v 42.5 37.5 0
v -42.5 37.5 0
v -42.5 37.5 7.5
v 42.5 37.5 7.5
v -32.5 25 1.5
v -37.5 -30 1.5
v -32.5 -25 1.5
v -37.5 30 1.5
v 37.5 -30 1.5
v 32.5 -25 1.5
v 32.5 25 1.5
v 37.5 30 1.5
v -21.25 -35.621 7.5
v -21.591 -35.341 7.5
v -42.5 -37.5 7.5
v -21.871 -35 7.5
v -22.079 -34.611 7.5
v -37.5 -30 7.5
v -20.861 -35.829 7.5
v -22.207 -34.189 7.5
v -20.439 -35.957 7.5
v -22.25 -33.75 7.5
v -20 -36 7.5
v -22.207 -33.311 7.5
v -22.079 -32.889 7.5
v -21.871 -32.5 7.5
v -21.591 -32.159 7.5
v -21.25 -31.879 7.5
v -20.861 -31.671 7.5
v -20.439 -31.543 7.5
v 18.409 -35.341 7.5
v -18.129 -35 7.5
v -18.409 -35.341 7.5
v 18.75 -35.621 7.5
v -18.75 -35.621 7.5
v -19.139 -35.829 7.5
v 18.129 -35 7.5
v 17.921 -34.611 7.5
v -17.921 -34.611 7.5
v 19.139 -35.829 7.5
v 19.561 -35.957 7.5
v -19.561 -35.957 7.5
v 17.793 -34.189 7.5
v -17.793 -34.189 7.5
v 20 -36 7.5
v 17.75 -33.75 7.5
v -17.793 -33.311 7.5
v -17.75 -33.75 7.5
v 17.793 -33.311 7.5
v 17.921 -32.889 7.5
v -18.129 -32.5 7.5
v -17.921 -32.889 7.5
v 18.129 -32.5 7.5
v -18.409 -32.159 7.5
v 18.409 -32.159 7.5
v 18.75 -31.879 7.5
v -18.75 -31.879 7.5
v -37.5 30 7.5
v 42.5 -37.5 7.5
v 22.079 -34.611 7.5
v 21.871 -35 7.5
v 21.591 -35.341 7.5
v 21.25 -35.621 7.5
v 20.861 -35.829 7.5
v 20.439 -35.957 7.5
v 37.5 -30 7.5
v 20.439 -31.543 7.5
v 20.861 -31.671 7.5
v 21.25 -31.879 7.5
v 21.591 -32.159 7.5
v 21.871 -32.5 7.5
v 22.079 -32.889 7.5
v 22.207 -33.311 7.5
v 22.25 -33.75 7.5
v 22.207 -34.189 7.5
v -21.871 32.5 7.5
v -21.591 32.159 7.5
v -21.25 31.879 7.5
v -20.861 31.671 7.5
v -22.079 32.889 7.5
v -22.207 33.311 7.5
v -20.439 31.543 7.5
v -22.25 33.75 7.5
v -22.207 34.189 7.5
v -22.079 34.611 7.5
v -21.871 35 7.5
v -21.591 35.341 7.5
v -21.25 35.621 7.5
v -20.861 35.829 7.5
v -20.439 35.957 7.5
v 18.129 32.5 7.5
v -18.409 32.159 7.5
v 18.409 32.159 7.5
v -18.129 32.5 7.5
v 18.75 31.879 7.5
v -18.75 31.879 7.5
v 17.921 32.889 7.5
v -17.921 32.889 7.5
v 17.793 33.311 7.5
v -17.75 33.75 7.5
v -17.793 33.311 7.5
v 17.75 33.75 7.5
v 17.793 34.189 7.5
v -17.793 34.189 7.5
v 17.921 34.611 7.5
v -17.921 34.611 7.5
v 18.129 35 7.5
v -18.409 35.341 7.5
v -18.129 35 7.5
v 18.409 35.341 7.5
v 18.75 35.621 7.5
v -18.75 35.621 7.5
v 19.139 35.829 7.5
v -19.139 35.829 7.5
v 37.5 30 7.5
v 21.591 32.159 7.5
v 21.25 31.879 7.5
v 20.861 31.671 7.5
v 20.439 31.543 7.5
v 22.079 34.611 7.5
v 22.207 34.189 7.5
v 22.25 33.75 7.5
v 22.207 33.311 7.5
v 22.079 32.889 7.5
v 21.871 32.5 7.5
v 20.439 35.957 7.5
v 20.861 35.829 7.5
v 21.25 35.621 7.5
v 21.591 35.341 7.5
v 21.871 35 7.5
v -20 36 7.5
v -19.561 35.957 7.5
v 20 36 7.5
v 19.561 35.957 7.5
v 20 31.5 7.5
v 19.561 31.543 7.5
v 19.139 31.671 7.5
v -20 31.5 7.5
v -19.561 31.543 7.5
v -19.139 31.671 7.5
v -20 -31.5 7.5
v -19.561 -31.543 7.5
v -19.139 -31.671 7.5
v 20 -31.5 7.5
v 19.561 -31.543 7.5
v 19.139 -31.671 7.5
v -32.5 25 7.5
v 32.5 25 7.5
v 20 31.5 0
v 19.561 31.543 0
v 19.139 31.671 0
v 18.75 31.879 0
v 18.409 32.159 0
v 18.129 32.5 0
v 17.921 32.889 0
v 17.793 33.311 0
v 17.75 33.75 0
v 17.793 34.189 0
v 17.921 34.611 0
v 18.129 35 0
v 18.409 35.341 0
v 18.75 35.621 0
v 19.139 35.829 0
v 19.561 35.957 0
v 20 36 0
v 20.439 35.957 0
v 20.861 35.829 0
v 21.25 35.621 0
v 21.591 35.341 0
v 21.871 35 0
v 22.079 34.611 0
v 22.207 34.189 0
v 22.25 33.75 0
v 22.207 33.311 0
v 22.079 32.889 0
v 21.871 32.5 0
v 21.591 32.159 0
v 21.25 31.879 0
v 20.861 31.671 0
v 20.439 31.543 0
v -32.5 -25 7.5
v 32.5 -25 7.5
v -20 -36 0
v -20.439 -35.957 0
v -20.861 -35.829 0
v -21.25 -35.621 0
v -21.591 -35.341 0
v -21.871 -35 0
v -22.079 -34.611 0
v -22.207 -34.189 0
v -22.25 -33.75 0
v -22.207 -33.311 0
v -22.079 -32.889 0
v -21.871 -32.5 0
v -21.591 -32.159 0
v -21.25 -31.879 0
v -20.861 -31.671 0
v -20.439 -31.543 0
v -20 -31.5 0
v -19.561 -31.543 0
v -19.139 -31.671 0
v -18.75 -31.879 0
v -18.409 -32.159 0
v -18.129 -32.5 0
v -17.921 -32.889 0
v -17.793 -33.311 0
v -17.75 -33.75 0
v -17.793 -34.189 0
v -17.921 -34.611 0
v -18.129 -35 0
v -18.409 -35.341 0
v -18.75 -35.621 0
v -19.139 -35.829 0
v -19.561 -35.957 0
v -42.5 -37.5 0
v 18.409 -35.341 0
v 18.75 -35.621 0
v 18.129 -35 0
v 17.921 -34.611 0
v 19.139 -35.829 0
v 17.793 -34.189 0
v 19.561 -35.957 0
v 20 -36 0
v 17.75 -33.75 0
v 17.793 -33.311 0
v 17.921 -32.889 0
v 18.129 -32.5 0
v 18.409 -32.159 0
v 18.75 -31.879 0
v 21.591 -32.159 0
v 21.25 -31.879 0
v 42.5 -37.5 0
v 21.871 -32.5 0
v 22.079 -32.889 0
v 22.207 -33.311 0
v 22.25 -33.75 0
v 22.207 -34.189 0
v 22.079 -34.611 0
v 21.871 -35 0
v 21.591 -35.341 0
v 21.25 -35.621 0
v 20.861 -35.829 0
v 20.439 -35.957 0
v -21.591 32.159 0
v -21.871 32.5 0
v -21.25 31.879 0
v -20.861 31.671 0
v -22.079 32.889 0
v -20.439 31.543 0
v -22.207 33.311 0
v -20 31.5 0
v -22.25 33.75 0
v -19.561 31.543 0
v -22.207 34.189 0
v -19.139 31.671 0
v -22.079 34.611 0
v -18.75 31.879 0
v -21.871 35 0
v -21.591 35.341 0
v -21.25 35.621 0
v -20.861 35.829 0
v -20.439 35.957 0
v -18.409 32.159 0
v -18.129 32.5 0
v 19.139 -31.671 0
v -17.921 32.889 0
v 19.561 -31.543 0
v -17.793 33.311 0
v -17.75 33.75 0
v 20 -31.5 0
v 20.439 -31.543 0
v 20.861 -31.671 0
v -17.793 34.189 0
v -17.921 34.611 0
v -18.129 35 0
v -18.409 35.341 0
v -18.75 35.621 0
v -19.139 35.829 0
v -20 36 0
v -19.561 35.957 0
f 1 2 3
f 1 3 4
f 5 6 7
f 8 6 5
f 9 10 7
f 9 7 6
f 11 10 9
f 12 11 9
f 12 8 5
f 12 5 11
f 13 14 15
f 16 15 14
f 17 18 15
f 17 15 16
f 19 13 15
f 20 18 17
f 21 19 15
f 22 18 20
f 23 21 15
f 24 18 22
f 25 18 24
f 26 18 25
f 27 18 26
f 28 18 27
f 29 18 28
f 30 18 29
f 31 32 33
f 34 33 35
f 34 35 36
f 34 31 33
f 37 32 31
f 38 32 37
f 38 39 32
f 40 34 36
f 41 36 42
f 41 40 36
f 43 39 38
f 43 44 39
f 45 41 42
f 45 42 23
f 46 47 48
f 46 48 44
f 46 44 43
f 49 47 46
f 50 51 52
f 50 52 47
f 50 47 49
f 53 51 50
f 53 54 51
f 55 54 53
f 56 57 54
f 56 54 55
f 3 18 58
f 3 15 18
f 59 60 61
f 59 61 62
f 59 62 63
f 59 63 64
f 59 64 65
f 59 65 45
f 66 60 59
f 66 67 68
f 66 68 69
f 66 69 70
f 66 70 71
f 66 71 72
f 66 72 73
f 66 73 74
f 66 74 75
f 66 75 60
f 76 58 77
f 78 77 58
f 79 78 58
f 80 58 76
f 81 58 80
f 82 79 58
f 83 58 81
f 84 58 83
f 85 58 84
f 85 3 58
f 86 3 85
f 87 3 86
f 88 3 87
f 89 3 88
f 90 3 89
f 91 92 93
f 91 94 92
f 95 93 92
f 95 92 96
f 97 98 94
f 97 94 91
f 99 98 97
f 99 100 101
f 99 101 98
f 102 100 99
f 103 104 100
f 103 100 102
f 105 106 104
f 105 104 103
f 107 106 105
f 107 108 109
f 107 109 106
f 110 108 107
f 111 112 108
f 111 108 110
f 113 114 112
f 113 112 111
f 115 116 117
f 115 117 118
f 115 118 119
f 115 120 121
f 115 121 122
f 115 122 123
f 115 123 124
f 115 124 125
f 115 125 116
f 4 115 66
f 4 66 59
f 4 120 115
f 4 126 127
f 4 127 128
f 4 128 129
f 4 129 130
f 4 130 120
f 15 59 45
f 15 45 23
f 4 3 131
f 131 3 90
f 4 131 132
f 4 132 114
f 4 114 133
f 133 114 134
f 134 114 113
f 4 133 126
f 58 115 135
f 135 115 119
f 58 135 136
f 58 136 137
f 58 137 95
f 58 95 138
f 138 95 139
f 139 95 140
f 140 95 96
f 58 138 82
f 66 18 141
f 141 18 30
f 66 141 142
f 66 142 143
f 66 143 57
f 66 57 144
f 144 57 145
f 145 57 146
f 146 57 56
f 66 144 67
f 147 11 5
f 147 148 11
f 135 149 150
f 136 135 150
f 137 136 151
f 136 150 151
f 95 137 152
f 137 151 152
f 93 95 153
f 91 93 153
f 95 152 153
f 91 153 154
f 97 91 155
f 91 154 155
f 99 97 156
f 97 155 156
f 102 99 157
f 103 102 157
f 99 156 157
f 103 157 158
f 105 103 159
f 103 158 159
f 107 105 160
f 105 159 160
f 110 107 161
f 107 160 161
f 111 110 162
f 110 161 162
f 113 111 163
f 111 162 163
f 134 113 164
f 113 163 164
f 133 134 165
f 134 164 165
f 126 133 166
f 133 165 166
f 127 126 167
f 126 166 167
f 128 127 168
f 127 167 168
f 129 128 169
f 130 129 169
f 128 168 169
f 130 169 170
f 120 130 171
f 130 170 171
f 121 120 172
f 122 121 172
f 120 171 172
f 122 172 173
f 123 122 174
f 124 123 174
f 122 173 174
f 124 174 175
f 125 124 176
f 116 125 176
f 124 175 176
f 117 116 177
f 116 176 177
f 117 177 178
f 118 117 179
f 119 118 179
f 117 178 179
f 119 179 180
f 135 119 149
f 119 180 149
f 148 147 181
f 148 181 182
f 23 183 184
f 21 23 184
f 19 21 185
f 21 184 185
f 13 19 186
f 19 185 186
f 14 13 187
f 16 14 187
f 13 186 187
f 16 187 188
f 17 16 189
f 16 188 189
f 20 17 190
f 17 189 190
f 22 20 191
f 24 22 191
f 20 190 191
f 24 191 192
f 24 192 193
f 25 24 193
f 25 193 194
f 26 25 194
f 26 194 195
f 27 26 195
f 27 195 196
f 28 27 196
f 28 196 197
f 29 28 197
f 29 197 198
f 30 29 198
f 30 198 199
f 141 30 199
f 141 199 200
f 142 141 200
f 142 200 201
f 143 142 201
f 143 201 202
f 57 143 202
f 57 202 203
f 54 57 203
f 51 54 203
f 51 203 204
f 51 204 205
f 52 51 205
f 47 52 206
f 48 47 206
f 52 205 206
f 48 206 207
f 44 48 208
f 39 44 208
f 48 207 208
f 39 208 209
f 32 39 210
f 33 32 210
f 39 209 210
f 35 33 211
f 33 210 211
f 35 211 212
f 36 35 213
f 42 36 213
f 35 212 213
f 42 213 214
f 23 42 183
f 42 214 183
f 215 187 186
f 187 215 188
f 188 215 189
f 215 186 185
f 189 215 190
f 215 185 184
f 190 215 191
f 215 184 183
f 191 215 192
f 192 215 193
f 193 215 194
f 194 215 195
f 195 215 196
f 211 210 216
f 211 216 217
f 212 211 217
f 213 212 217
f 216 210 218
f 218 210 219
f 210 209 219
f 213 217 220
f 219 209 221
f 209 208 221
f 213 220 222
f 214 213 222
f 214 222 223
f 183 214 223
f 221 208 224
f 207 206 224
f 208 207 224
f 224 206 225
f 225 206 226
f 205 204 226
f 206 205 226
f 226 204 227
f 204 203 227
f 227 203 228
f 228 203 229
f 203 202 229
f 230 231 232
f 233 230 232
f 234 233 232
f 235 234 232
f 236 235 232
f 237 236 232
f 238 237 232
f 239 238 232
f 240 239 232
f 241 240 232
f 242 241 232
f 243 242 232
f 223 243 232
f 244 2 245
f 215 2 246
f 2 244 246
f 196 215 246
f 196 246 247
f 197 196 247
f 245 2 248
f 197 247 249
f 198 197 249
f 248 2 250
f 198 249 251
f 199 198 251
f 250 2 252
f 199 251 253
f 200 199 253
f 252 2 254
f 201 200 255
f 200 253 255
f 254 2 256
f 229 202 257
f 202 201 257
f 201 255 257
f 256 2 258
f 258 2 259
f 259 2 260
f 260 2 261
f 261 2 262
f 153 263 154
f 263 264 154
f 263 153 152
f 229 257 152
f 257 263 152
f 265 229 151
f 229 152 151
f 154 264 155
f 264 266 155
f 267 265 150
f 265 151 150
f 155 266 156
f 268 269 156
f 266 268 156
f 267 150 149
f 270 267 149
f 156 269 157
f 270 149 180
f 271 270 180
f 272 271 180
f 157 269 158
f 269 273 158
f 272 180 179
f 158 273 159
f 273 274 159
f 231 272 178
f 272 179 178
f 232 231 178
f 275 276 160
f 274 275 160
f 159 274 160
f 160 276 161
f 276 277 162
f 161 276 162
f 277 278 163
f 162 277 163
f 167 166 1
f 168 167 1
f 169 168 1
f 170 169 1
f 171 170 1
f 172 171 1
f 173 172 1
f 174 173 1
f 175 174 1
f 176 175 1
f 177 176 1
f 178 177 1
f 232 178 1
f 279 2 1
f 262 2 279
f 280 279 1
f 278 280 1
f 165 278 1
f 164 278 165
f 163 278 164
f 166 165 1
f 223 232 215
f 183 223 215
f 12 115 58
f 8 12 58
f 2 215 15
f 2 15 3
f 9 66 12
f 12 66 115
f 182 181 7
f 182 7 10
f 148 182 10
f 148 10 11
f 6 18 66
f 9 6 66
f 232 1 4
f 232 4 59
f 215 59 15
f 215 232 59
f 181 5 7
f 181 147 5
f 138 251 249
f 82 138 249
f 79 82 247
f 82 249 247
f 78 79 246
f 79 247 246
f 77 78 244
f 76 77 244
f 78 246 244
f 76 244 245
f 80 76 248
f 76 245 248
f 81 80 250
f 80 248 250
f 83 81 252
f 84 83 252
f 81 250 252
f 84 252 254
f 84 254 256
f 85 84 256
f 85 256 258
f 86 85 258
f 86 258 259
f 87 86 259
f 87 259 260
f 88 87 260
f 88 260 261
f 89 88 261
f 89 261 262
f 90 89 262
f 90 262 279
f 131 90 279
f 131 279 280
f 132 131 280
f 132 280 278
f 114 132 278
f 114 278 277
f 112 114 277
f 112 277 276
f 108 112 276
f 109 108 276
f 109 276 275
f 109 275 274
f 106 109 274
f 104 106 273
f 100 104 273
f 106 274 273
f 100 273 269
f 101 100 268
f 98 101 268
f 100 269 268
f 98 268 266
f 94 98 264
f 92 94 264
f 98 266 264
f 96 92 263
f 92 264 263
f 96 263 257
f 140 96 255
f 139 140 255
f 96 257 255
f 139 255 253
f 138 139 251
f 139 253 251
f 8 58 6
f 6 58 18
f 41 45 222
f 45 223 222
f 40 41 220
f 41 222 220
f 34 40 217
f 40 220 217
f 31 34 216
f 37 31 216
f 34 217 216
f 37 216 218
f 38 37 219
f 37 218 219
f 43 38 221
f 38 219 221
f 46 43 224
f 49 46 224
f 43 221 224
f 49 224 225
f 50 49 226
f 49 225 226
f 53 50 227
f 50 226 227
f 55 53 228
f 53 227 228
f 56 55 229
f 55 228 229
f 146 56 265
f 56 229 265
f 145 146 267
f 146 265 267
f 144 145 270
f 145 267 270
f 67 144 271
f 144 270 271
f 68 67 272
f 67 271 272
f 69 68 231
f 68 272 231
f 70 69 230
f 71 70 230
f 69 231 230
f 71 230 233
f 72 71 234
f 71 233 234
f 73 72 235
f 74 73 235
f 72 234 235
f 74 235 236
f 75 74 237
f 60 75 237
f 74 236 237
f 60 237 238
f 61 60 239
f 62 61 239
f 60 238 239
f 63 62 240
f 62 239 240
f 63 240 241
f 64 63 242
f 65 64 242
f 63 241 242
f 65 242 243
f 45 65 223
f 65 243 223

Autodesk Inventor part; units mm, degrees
ref_plane "YZ Plane" through (0, 0, 0) normal (1, 0, 0) x (0, 1, 0)
ref_plane "XZ Plane" through (0, 0, 0) normal (0, 1, 0) x (-1, 0, 0)
ref_plane "XY Plane" through (0, 0, 0) normal (0, 0, 1) x (1, 0, 0)
sketch "Sketch1" plane through (0, 0, 0) normal (0, 0, 1) x (1, 0, 0)
  line L0 (-42.5, 37.5) -> (42.5, 37.5)
  line L1 (42.5, 37.5) -> (42.5, -37.5)
  line L2 (42.5, -37.5) -> (-42.5, -37.5)
  line L3 (-42.5, -37.5) -> (-42.5, 37.5)
  point P0 (0, 0)
  dimension "d0" = 85
  dimension "d1" = 75
  dimension "d2" = 37.5
  dimension "d3" = 42.5
extrude "Extrusion1" add sketch "Sketch1" along normal blind 7.5
sketch "Sketch2" plane through (0, 0, 7.5) normal (0, 0, 1) x (1, 0, 0)
  point P0 (0, 0)
  point P1 (20, -33.75)
  point P2 (-20, -33.75)
  point P3 (-20, 33.75)
  point P4 (20, 33.75)
  dimension "d6" = 40
  dimension "d7" = 20
  dimension "d8" = 67.5
  dimension "d9" = 33.75
hole "Hole1" at (20, -33.75, 7.5) at (-20, -33.75, 7.5) at (-20, 33.75, 7.5) at (20, 33.75, 7.5) direction (0, 0, -1) diameter 4.5 depth 9.525 tip angle 118 clearance for "Countersunk Flat Head Screw ISO 2009/7046" size "M4" standard "ISO"
sketch "Sketch3" plane through (0, 0, 7.5) normal (0, 0, 1) x (1, 0, 0)
  line L0 (-37.5, -30) -> (37.5, -30)
  line L1 (37.5, -30) -> (37.5, 30)
  line L2 (37.5, 30) -> (-37.5, 30)
  line L3 (-37.5, 30) -> (-37.5, -30)
  line L4 (-32.5, -25) -> (32.5, -25)
  line L5 (32.5, -25) -> (32.5, 25)
  line L6 (32.5, 25) -> (-32.5, 25)
  line L7 (-32.5, 25) -> (-32.5, -25)
  point P0 (0, 0)
  dimension "d19" = 75
  dimension "d22" = 60
  dimension "d23" = 30
  dimension "d24" = 5
  dimension "d26" = 37.5
  dimension "d27" = 5
  dimension "d29" = 5
  dimension "d30" = 5
extrude "Extrusion2" cut sketch "Sketch3" against normal blind 6
equation "\"d2\" = 0.5 * d1"
equation "\"d3\" = 0.5 * d0"
equation "\"d7\" = 0.5 * d6"
equation "\"d9\" = 0.5 * d8"
equation "\"d23\" = 0.5 * d22"
equation "\"d26\" = 0.5 * d19"
equation "\"d27\" = d24"
equation "\"d29\" = d24"
equation "\"d30\" = d24"
properties part number "smallSampleHolder"
